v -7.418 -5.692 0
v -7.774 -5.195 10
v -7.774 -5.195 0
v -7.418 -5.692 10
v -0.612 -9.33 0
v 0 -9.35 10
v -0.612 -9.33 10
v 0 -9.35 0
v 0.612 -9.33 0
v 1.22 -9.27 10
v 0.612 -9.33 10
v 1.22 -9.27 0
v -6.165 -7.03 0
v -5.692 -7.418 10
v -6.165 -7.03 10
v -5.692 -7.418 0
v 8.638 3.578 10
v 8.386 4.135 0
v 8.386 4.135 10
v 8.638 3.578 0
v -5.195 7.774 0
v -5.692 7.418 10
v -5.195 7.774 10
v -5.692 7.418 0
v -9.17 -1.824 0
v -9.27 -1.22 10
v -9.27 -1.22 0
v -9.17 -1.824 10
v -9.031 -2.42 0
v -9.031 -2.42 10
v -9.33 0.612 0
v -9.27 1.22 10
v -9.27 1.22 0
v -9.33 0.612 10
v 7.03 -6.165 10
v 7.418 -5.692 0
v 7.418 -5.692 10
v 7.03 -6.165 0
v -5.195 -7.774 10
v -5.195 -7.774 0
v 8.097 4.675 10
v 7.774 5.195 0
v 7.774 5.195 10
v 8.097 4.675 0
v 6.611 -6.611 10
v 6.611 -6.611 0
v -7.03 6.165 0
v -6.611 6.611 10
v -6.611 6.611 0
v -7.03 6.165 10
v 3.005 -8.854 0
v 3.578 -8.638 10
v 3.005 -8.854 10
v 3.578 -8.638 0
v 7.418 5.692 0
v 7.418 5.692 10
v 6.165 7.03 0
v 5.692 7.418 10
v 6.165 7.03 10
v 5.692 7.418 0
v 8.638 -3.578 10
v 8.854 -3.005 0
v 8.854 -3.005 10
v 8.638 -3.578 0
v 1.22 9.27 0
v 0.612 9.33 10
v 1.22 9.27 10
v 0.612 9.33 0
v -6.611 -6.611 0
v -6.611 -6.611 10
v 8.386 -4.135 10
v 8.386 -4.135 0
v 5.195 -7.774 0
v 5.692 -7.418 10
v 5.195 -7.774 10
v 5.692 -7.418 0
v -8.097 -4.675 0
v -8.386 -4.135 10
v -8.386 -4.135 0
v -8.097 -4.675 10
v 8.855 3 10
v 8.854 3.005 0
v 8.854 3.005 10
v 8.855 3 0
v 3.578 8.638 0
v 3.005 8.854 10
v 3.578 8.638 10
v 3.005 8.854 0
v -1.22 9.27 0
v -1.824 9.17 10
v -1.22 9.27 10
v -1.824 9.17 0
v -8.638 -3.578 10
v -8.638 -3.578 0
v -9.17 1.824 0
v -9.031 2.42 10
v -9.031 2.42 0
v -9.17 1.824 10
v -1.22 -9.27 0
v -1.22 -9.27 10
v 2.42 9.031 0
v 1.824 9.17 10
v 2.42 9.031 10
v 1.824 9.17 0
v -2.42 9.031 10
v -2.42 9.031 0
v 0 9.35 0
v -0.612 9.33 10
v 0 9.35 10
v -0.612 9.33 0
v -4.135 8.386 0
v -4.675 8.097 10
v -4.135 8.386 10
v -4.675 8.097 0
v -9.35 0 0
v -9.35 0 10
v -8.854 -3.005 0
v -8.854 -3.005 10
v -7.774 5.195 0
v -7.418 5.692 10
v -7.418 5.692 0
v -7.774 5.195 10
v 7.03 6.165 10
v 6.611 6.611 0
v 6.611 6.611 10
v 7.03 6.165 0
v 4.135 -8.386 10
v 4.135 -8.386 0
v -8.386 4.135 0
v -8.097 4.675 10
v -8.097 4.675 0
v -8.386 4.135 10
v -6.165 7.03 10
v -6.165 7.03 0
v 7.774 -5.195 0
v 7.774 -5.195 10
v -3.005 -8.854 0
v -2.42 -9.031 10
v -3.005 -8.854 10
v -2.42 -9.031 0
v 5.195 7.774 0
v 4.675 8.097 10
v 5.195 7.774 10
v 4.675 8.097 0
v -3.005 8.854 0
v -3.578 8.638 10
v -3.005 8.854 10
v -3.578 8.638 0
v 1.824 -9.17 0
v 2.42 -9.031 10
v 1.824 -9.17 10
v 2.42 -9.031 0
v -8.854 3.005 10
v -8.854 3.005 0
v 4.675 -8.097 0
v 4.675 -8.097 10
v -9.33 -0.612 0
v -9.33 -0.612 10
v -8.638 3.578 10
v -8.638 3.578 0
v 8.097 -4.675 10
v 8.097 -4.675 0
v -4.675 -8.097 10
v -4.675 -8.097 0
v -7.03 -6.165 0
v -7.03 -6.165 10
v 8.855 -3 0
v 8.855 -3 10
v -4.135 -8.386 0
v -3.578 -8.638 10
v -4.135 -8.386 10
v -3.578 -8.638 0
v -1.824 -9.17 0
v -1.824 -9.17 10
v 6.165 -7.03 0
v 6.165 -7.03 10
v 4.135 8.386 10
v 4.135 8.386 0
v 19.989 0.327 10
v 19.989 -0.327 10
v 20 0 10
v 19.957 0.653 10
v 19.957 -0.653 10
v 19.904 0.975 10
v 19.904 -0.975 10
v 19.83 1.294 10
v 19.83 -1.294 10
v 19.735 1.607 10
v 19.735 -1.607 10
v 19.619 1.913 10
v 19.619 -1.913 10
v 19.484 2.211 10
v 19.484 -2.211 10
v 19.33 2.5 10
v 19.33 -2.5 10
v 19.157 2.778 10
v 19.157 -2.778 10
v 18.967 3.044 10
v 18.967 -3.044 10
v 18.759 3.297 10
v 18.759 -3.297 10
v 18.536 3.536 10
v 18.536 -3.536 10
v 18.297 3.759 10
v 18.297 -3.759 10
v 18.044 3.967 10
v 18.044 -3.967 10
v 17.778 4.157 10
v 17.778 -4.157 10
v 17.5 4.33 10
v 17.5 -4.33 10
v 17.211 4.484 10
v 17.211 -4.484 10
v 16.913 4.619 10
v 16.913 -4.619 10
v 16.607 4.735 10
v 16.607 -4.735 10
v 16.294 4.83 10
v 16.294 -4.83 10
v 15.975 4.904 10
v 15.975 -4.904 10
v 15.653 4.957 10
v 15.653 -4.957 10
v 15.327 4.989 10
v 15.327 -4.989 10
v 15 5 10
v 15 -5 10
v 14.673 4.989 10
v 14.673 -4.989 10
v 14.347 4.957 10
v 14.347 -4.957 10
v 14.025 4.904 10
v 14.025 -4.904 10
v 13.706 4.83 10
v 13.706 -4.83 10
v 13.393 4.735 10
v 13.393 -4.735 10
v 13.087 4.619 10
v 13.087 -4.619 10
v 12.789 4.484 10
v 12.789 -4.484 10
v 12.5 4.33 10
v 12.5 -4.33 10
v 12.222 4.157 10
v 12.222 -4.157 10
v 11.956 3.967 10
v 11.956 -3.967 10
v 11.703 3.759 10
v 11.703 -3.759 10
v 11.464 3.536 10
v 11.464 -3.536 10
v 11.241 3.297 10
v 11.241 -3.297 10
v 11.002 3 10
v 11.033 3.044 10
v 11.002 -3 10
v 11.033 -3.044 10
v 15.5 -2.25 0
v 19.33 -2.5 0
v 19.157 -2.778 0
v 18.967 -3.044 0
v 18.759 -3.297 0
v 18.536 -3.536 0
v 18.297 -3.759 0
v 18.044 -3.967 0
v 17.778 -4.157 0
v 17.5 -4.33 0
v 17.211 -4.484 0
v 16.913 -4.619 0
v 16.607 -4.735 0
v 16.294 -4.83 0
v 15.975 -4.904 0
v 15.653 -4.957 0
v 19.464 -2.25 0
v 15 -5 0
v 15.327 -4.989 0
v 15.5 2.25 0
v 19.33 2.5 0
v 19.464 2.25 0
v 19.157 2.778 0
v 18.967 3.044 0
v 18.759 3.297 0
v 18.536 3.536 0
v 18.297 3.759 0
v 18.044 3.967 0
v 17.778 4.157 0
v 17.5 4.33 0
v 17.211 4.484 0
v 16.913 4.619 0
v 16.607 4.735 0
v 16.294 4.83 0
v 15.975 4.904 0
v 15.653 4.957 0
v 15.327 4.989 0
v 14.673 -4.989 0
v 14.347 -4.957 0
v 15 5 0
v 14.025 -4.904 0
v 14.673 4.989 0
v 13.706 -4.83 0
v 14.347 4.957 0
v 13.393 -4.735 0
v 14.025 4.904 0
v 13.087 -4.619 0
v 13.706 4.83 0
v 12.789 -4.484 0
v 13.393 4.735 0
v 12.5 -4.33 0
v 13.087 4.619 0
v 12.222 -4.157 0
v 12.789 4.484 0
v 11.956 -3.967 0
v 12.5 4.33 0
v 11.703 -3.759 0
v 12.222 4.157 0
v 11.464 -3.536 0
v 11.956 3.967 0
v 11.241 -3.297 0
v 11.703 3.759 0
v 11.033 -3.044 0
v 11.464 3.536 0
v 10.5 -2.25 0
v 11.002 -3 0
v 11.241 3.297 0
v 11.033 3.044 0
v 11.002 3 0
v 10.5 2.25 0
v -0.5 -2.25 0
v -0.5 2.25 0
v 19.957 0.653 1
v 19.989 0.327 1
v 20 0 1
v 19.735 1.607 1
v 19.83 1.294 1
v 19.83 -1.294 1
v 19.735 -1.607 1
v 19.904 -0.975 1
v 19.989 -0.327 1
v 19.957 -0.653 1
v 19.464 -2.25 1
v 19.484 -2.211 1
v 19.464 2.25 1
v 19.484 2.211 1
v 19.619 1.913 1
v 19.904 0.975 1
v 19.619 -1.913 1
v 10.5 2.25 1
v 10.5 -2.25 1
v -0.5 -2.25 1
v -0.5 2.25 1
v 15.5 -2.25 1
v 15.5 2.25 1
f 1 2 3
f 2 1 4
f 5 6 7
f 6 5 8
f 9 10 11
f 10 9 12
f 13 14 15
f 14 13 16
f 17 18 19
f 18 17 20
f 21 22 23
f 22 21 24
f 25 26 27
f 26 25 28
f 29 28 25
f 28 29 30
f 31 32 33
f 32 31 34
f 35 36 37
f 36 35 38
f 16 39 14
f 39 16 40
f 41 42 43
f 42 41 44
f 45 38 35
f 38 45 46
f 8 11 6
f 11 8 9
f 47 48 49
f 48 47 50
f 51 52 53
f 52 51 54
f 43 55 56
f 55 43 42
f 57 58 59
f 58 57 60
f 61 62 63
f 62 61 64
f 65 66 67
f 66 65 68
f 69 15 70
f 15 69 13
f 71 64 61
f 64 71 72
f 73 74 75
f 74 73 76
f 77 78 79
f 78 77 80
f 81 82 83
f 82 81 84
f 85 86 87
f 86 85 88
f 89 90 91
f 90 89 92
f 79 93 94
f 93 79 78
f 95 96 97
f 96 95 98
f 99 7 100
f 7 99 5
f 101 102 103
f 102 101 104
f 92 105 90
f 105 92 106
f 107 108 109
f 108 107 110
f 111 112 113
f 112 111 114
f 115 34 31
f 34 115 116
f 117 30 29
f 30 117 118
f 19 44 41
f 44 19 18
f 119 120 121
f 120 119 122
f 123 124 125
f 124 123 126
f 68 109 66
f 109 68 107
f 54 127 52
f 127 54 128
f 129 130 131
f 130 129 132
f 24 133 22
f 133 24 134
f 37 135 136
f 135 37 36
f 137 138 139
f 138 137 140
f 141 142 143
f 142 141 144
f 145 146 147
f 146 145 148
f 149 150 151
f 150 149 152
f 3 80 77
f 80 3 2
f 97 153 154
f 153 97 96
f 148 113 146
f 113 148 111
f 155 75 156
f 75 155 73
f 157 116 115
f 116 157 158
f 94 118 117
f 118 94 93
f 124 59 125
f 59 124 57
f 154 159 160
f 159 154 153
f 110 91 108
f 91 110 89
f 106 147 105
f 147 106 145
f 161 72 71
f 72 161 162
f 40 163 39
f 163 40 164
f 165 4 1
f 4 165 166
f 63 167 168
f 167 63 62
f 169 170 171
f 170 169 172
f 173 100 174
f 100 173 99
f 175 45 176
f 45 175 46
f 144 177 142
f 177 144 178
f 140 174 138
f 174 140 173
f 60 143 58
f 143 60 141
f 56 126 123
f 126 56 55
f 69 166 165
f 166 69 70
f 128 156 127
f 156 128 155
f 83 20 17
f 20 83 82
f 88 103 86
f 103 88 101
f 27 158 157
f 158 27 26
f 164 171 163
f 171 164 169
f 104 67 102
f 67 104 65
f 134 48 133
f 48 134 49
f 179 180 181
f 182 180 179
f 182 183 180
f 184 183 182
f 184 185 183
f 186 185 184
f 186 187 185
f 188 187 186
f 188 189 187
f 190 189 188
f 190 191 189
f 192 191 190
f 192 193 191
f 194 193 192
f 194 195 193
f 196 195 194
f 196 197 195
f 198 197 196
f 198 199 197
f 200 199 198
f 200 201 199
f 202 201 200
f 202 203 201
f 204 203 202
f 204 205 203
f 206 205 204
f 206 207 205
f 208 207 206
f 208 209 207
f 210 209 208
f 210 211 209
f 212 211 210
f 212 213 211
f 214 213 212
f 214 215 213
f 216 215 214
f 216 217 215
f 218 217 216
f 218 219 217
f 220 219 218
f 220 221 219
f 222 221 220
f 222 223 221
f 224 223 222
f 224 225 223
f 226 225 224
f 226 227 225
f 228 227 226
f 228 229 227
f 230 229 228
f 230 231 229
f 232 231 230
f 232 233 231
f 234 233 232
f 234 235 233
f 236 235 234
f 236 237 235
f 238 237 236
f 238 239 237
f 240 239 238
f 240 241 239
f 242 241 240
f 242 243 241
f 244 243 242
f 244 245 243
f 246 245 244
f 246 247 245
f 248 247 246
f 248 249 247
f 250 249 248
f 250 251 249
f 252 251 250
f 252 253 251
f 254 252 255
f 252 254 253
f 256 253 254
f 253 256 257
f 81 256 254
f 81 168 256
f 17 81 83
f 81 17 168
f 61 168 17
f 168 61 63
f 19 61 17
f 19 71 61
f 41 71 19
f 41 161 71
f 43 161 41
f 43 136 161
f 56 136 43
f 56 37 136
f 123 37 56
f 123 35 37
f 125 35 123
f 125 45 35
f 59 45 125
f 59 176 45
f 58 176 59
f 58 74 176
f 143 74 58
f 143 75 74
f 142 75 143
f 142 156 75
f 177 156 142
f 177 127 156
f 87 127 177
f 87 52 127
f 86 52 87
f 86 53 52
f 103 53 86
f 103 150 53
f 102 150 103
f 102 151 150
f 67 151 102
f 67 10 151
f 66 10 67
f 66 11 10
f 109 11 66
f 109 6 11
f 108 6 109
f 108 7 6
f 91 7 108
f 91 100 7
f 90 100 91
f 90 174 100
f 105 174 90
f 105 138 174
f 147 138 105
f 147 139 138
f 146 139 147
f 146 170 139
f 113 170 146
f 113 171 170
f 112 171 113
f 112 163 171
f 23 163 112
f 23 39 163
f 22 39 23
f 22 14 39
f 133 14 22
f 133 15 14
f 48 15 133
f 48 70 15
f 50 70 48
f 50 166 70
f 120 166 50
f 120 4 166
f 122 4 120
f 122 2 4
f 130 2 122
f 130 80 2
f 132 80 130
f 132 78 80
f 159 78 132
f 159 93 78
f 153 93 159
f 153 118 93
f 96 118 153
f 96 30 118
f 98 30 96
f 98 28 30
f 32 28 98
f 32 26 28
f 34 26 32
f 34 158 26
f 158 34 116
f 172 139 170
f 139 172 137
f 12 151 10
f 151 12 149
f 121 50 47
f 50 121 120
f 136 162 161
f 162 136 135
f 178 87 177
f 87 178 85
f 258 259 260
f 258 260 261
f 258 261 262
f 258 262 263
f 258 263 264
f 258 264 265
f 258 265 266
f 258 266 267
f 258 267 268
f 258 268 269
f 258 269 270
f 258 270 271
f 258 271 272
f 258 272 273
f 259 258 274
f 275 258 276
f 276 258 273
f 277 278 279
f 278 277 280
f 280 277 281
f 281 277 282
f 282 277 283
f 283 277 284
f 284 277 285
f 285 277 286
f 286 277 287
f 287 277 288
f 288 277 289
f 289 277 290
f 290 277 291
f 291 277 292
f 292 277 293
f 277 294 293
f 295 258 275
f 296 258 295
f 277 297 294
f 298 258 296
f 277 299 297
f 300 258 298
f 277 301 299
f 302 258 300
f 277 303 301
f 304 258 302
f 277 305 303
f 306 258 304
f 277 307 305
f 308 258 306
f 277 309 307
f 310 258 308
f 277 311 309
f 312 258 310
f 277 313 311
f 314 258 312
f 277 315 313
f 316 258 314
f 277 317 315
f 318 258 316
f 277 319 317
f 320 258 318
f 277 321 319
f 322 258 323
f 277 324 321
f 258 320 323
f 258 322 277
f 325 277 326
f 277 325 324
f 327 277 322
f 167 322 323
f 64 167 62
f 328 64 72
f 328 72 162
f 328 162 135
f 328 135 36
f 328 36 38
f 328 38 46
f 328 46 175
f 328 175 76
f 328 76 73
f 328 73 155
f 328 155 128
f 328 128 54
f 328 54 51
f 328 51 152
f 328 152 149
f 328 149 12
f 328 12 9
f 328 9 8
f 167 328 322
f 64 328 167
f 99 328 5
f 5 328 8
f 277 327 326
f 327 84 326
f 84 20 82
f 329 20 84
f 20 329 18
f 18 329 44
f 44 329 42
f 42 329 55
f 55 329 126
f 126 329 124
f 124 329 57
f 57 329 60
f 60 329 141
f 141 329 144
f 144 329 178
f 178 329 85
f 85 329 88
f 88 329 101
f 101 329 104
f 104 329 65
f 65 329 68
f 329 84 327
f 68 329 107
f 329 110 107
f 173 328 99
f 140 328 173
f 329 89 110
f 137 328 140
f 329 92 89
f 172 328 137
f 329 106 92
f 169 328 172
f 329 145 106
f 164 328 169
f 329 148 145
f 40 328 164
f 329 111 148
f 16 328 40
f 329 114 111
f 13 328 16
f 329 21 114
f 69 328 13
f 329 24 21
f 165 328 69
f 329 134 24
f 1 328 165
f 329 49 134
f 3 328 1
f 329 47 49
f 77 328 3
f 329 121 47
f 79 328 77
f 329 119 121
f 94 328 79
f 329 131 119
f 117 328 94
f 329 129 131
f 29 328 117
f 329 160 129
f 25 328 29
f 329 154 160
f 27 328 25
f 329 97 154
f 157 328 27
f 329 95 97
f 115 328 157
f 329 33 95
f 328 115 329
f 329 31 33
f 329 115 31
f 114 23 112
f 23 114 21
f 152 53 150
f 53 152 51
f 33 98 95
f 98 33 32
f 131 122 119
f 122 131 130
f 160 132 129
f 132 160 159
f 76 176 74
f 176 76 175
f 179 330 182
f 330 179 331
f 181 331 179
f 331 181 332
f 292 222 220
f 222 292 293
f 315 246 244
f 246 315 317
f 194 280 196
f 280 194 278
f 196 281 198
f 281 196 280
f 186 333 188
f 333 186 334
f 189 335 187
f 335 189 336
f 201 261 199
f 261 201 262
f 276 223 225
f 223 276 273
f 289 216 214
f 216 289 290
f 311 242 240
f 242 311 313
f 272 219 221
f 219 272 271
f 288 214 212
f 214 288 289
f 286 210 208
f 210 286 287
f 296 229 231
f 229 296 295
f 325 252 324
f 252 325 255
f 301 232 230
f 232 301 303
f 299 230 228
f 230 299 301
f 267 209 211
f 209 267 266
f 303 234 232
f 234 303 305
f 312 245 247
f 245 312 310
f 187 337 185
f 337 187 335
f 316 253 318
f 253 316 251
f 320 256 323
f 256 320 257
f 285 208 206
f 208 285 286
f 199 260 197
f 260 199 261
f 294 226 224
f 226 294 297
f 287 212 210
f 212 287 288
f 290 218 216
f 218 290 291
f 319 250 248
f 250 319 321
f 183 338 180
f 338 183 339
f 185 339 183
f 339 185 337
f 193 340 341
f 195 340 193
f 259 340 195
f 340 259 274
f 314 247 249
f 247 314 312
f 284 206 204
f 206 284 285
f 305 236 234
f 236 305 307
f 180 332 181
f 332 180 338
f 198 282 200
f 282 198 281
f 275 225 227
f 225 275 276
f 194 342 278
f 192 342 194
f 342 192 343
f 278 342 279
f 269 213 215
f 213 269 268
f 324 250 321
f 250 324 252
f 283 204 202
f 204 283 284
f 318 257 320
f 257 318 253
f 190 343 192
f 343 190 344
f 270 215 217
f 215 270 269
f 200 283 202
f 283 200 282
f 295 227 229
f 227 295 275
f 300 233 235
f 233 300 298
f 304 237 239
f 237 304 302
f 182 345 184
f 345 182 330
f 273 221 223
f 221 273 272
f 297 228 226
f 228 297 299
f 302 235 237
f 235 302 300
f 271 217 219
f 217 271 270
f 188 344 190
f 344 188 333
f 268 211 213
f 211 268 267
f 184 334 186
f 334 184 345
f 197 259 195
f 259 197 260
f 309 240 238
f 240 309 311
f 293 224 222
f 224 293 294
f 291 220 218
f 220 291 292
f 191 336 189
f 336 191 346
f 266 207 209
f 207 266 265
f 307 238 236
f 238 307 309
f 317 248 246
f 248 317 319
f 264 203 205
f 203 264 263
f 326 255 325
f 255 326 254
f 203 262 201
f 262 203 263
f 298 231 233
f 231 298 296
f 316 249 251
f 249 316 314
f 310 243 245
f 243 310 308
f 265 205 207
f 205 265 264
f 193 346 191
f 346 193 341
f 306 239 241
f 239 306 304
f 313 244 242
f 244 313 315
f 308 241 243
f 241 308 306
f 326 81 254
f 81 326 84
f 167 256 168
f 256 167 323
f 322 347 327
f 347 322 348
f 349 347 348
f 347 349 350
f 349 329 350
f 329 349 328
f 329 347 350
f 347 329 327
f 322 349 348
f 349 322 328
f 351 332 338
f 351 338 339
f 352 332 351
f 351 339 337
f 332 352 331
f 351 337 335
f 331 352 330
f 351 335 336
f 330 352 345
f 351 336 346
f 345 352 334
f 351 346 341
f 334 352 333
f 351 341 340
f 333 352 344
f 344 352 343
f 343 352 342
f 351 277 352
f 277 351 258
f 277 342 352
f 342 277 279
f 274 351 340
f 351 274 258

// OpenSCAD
// Snap-on tubing clip for a 12.7 mm lab stand rod
// Print orientation: flat on bed, extruded along +Z

// ---------------- Parameters ----------------
ring_od      = 18.7;   // rod ring outer diameter
ring_id      = 12.7;   // rod ring inner diameter
ring_w       = 3;      // rod ring wall thickness

tubing_id    = 6;      // tubing ring inner diameter
tubing_od    = tubing_id + 2 * 2;  // tubing ring outer diameter (4 mm wall)
tubing_x     = 15;     // tubing ring centre X
tubing_y     = 0;      // tubing ring centre Y

bridge_w     = 6;      // bridge width along Y
bridge_x0    = 8;      // bridge start X
bridge_x1    = 12;     // bridge end X

opening_w    = 10;     // rod ring opening width (-X side)
opening_h    = 4.5;    // tubing ring opening height (+X side)

eps          = 0.5;    // cutter overshoot past faces
$fn          = 96;     // curve resolution

// ---------------- Model ----------------
difference() {
    union() {
        // Rod ring
        cylinder(d = ring_od, h = 10);
        // Tubing ring
        translate([tubing_x, tubing_y, 0])
            cylinder(d = tubing_od, h = 10);
        // Solid bridge between the rings
        translate([bridge_x0, -bridge_w / 2, 0])
            cube([bridge_x1 - bridge_x0, bridge_w, 10]);
    }

    // Cut out the -X side of the rod ring (x < 0, -5 < y < 5)
    translate([-eps, -opening_h / 2, -eps])
        cube([opening_w + 2 * eps, opening_h, eps + 1]);

    // Cut out the +X side of the tubing ring (x > 15, -2.25 < y < 2.25)
    translate([tubing_x + eps, -opening_h / 2, -eps])
        cube([opening_w + 2 * eps, opening_h, eps + 1]);
}
